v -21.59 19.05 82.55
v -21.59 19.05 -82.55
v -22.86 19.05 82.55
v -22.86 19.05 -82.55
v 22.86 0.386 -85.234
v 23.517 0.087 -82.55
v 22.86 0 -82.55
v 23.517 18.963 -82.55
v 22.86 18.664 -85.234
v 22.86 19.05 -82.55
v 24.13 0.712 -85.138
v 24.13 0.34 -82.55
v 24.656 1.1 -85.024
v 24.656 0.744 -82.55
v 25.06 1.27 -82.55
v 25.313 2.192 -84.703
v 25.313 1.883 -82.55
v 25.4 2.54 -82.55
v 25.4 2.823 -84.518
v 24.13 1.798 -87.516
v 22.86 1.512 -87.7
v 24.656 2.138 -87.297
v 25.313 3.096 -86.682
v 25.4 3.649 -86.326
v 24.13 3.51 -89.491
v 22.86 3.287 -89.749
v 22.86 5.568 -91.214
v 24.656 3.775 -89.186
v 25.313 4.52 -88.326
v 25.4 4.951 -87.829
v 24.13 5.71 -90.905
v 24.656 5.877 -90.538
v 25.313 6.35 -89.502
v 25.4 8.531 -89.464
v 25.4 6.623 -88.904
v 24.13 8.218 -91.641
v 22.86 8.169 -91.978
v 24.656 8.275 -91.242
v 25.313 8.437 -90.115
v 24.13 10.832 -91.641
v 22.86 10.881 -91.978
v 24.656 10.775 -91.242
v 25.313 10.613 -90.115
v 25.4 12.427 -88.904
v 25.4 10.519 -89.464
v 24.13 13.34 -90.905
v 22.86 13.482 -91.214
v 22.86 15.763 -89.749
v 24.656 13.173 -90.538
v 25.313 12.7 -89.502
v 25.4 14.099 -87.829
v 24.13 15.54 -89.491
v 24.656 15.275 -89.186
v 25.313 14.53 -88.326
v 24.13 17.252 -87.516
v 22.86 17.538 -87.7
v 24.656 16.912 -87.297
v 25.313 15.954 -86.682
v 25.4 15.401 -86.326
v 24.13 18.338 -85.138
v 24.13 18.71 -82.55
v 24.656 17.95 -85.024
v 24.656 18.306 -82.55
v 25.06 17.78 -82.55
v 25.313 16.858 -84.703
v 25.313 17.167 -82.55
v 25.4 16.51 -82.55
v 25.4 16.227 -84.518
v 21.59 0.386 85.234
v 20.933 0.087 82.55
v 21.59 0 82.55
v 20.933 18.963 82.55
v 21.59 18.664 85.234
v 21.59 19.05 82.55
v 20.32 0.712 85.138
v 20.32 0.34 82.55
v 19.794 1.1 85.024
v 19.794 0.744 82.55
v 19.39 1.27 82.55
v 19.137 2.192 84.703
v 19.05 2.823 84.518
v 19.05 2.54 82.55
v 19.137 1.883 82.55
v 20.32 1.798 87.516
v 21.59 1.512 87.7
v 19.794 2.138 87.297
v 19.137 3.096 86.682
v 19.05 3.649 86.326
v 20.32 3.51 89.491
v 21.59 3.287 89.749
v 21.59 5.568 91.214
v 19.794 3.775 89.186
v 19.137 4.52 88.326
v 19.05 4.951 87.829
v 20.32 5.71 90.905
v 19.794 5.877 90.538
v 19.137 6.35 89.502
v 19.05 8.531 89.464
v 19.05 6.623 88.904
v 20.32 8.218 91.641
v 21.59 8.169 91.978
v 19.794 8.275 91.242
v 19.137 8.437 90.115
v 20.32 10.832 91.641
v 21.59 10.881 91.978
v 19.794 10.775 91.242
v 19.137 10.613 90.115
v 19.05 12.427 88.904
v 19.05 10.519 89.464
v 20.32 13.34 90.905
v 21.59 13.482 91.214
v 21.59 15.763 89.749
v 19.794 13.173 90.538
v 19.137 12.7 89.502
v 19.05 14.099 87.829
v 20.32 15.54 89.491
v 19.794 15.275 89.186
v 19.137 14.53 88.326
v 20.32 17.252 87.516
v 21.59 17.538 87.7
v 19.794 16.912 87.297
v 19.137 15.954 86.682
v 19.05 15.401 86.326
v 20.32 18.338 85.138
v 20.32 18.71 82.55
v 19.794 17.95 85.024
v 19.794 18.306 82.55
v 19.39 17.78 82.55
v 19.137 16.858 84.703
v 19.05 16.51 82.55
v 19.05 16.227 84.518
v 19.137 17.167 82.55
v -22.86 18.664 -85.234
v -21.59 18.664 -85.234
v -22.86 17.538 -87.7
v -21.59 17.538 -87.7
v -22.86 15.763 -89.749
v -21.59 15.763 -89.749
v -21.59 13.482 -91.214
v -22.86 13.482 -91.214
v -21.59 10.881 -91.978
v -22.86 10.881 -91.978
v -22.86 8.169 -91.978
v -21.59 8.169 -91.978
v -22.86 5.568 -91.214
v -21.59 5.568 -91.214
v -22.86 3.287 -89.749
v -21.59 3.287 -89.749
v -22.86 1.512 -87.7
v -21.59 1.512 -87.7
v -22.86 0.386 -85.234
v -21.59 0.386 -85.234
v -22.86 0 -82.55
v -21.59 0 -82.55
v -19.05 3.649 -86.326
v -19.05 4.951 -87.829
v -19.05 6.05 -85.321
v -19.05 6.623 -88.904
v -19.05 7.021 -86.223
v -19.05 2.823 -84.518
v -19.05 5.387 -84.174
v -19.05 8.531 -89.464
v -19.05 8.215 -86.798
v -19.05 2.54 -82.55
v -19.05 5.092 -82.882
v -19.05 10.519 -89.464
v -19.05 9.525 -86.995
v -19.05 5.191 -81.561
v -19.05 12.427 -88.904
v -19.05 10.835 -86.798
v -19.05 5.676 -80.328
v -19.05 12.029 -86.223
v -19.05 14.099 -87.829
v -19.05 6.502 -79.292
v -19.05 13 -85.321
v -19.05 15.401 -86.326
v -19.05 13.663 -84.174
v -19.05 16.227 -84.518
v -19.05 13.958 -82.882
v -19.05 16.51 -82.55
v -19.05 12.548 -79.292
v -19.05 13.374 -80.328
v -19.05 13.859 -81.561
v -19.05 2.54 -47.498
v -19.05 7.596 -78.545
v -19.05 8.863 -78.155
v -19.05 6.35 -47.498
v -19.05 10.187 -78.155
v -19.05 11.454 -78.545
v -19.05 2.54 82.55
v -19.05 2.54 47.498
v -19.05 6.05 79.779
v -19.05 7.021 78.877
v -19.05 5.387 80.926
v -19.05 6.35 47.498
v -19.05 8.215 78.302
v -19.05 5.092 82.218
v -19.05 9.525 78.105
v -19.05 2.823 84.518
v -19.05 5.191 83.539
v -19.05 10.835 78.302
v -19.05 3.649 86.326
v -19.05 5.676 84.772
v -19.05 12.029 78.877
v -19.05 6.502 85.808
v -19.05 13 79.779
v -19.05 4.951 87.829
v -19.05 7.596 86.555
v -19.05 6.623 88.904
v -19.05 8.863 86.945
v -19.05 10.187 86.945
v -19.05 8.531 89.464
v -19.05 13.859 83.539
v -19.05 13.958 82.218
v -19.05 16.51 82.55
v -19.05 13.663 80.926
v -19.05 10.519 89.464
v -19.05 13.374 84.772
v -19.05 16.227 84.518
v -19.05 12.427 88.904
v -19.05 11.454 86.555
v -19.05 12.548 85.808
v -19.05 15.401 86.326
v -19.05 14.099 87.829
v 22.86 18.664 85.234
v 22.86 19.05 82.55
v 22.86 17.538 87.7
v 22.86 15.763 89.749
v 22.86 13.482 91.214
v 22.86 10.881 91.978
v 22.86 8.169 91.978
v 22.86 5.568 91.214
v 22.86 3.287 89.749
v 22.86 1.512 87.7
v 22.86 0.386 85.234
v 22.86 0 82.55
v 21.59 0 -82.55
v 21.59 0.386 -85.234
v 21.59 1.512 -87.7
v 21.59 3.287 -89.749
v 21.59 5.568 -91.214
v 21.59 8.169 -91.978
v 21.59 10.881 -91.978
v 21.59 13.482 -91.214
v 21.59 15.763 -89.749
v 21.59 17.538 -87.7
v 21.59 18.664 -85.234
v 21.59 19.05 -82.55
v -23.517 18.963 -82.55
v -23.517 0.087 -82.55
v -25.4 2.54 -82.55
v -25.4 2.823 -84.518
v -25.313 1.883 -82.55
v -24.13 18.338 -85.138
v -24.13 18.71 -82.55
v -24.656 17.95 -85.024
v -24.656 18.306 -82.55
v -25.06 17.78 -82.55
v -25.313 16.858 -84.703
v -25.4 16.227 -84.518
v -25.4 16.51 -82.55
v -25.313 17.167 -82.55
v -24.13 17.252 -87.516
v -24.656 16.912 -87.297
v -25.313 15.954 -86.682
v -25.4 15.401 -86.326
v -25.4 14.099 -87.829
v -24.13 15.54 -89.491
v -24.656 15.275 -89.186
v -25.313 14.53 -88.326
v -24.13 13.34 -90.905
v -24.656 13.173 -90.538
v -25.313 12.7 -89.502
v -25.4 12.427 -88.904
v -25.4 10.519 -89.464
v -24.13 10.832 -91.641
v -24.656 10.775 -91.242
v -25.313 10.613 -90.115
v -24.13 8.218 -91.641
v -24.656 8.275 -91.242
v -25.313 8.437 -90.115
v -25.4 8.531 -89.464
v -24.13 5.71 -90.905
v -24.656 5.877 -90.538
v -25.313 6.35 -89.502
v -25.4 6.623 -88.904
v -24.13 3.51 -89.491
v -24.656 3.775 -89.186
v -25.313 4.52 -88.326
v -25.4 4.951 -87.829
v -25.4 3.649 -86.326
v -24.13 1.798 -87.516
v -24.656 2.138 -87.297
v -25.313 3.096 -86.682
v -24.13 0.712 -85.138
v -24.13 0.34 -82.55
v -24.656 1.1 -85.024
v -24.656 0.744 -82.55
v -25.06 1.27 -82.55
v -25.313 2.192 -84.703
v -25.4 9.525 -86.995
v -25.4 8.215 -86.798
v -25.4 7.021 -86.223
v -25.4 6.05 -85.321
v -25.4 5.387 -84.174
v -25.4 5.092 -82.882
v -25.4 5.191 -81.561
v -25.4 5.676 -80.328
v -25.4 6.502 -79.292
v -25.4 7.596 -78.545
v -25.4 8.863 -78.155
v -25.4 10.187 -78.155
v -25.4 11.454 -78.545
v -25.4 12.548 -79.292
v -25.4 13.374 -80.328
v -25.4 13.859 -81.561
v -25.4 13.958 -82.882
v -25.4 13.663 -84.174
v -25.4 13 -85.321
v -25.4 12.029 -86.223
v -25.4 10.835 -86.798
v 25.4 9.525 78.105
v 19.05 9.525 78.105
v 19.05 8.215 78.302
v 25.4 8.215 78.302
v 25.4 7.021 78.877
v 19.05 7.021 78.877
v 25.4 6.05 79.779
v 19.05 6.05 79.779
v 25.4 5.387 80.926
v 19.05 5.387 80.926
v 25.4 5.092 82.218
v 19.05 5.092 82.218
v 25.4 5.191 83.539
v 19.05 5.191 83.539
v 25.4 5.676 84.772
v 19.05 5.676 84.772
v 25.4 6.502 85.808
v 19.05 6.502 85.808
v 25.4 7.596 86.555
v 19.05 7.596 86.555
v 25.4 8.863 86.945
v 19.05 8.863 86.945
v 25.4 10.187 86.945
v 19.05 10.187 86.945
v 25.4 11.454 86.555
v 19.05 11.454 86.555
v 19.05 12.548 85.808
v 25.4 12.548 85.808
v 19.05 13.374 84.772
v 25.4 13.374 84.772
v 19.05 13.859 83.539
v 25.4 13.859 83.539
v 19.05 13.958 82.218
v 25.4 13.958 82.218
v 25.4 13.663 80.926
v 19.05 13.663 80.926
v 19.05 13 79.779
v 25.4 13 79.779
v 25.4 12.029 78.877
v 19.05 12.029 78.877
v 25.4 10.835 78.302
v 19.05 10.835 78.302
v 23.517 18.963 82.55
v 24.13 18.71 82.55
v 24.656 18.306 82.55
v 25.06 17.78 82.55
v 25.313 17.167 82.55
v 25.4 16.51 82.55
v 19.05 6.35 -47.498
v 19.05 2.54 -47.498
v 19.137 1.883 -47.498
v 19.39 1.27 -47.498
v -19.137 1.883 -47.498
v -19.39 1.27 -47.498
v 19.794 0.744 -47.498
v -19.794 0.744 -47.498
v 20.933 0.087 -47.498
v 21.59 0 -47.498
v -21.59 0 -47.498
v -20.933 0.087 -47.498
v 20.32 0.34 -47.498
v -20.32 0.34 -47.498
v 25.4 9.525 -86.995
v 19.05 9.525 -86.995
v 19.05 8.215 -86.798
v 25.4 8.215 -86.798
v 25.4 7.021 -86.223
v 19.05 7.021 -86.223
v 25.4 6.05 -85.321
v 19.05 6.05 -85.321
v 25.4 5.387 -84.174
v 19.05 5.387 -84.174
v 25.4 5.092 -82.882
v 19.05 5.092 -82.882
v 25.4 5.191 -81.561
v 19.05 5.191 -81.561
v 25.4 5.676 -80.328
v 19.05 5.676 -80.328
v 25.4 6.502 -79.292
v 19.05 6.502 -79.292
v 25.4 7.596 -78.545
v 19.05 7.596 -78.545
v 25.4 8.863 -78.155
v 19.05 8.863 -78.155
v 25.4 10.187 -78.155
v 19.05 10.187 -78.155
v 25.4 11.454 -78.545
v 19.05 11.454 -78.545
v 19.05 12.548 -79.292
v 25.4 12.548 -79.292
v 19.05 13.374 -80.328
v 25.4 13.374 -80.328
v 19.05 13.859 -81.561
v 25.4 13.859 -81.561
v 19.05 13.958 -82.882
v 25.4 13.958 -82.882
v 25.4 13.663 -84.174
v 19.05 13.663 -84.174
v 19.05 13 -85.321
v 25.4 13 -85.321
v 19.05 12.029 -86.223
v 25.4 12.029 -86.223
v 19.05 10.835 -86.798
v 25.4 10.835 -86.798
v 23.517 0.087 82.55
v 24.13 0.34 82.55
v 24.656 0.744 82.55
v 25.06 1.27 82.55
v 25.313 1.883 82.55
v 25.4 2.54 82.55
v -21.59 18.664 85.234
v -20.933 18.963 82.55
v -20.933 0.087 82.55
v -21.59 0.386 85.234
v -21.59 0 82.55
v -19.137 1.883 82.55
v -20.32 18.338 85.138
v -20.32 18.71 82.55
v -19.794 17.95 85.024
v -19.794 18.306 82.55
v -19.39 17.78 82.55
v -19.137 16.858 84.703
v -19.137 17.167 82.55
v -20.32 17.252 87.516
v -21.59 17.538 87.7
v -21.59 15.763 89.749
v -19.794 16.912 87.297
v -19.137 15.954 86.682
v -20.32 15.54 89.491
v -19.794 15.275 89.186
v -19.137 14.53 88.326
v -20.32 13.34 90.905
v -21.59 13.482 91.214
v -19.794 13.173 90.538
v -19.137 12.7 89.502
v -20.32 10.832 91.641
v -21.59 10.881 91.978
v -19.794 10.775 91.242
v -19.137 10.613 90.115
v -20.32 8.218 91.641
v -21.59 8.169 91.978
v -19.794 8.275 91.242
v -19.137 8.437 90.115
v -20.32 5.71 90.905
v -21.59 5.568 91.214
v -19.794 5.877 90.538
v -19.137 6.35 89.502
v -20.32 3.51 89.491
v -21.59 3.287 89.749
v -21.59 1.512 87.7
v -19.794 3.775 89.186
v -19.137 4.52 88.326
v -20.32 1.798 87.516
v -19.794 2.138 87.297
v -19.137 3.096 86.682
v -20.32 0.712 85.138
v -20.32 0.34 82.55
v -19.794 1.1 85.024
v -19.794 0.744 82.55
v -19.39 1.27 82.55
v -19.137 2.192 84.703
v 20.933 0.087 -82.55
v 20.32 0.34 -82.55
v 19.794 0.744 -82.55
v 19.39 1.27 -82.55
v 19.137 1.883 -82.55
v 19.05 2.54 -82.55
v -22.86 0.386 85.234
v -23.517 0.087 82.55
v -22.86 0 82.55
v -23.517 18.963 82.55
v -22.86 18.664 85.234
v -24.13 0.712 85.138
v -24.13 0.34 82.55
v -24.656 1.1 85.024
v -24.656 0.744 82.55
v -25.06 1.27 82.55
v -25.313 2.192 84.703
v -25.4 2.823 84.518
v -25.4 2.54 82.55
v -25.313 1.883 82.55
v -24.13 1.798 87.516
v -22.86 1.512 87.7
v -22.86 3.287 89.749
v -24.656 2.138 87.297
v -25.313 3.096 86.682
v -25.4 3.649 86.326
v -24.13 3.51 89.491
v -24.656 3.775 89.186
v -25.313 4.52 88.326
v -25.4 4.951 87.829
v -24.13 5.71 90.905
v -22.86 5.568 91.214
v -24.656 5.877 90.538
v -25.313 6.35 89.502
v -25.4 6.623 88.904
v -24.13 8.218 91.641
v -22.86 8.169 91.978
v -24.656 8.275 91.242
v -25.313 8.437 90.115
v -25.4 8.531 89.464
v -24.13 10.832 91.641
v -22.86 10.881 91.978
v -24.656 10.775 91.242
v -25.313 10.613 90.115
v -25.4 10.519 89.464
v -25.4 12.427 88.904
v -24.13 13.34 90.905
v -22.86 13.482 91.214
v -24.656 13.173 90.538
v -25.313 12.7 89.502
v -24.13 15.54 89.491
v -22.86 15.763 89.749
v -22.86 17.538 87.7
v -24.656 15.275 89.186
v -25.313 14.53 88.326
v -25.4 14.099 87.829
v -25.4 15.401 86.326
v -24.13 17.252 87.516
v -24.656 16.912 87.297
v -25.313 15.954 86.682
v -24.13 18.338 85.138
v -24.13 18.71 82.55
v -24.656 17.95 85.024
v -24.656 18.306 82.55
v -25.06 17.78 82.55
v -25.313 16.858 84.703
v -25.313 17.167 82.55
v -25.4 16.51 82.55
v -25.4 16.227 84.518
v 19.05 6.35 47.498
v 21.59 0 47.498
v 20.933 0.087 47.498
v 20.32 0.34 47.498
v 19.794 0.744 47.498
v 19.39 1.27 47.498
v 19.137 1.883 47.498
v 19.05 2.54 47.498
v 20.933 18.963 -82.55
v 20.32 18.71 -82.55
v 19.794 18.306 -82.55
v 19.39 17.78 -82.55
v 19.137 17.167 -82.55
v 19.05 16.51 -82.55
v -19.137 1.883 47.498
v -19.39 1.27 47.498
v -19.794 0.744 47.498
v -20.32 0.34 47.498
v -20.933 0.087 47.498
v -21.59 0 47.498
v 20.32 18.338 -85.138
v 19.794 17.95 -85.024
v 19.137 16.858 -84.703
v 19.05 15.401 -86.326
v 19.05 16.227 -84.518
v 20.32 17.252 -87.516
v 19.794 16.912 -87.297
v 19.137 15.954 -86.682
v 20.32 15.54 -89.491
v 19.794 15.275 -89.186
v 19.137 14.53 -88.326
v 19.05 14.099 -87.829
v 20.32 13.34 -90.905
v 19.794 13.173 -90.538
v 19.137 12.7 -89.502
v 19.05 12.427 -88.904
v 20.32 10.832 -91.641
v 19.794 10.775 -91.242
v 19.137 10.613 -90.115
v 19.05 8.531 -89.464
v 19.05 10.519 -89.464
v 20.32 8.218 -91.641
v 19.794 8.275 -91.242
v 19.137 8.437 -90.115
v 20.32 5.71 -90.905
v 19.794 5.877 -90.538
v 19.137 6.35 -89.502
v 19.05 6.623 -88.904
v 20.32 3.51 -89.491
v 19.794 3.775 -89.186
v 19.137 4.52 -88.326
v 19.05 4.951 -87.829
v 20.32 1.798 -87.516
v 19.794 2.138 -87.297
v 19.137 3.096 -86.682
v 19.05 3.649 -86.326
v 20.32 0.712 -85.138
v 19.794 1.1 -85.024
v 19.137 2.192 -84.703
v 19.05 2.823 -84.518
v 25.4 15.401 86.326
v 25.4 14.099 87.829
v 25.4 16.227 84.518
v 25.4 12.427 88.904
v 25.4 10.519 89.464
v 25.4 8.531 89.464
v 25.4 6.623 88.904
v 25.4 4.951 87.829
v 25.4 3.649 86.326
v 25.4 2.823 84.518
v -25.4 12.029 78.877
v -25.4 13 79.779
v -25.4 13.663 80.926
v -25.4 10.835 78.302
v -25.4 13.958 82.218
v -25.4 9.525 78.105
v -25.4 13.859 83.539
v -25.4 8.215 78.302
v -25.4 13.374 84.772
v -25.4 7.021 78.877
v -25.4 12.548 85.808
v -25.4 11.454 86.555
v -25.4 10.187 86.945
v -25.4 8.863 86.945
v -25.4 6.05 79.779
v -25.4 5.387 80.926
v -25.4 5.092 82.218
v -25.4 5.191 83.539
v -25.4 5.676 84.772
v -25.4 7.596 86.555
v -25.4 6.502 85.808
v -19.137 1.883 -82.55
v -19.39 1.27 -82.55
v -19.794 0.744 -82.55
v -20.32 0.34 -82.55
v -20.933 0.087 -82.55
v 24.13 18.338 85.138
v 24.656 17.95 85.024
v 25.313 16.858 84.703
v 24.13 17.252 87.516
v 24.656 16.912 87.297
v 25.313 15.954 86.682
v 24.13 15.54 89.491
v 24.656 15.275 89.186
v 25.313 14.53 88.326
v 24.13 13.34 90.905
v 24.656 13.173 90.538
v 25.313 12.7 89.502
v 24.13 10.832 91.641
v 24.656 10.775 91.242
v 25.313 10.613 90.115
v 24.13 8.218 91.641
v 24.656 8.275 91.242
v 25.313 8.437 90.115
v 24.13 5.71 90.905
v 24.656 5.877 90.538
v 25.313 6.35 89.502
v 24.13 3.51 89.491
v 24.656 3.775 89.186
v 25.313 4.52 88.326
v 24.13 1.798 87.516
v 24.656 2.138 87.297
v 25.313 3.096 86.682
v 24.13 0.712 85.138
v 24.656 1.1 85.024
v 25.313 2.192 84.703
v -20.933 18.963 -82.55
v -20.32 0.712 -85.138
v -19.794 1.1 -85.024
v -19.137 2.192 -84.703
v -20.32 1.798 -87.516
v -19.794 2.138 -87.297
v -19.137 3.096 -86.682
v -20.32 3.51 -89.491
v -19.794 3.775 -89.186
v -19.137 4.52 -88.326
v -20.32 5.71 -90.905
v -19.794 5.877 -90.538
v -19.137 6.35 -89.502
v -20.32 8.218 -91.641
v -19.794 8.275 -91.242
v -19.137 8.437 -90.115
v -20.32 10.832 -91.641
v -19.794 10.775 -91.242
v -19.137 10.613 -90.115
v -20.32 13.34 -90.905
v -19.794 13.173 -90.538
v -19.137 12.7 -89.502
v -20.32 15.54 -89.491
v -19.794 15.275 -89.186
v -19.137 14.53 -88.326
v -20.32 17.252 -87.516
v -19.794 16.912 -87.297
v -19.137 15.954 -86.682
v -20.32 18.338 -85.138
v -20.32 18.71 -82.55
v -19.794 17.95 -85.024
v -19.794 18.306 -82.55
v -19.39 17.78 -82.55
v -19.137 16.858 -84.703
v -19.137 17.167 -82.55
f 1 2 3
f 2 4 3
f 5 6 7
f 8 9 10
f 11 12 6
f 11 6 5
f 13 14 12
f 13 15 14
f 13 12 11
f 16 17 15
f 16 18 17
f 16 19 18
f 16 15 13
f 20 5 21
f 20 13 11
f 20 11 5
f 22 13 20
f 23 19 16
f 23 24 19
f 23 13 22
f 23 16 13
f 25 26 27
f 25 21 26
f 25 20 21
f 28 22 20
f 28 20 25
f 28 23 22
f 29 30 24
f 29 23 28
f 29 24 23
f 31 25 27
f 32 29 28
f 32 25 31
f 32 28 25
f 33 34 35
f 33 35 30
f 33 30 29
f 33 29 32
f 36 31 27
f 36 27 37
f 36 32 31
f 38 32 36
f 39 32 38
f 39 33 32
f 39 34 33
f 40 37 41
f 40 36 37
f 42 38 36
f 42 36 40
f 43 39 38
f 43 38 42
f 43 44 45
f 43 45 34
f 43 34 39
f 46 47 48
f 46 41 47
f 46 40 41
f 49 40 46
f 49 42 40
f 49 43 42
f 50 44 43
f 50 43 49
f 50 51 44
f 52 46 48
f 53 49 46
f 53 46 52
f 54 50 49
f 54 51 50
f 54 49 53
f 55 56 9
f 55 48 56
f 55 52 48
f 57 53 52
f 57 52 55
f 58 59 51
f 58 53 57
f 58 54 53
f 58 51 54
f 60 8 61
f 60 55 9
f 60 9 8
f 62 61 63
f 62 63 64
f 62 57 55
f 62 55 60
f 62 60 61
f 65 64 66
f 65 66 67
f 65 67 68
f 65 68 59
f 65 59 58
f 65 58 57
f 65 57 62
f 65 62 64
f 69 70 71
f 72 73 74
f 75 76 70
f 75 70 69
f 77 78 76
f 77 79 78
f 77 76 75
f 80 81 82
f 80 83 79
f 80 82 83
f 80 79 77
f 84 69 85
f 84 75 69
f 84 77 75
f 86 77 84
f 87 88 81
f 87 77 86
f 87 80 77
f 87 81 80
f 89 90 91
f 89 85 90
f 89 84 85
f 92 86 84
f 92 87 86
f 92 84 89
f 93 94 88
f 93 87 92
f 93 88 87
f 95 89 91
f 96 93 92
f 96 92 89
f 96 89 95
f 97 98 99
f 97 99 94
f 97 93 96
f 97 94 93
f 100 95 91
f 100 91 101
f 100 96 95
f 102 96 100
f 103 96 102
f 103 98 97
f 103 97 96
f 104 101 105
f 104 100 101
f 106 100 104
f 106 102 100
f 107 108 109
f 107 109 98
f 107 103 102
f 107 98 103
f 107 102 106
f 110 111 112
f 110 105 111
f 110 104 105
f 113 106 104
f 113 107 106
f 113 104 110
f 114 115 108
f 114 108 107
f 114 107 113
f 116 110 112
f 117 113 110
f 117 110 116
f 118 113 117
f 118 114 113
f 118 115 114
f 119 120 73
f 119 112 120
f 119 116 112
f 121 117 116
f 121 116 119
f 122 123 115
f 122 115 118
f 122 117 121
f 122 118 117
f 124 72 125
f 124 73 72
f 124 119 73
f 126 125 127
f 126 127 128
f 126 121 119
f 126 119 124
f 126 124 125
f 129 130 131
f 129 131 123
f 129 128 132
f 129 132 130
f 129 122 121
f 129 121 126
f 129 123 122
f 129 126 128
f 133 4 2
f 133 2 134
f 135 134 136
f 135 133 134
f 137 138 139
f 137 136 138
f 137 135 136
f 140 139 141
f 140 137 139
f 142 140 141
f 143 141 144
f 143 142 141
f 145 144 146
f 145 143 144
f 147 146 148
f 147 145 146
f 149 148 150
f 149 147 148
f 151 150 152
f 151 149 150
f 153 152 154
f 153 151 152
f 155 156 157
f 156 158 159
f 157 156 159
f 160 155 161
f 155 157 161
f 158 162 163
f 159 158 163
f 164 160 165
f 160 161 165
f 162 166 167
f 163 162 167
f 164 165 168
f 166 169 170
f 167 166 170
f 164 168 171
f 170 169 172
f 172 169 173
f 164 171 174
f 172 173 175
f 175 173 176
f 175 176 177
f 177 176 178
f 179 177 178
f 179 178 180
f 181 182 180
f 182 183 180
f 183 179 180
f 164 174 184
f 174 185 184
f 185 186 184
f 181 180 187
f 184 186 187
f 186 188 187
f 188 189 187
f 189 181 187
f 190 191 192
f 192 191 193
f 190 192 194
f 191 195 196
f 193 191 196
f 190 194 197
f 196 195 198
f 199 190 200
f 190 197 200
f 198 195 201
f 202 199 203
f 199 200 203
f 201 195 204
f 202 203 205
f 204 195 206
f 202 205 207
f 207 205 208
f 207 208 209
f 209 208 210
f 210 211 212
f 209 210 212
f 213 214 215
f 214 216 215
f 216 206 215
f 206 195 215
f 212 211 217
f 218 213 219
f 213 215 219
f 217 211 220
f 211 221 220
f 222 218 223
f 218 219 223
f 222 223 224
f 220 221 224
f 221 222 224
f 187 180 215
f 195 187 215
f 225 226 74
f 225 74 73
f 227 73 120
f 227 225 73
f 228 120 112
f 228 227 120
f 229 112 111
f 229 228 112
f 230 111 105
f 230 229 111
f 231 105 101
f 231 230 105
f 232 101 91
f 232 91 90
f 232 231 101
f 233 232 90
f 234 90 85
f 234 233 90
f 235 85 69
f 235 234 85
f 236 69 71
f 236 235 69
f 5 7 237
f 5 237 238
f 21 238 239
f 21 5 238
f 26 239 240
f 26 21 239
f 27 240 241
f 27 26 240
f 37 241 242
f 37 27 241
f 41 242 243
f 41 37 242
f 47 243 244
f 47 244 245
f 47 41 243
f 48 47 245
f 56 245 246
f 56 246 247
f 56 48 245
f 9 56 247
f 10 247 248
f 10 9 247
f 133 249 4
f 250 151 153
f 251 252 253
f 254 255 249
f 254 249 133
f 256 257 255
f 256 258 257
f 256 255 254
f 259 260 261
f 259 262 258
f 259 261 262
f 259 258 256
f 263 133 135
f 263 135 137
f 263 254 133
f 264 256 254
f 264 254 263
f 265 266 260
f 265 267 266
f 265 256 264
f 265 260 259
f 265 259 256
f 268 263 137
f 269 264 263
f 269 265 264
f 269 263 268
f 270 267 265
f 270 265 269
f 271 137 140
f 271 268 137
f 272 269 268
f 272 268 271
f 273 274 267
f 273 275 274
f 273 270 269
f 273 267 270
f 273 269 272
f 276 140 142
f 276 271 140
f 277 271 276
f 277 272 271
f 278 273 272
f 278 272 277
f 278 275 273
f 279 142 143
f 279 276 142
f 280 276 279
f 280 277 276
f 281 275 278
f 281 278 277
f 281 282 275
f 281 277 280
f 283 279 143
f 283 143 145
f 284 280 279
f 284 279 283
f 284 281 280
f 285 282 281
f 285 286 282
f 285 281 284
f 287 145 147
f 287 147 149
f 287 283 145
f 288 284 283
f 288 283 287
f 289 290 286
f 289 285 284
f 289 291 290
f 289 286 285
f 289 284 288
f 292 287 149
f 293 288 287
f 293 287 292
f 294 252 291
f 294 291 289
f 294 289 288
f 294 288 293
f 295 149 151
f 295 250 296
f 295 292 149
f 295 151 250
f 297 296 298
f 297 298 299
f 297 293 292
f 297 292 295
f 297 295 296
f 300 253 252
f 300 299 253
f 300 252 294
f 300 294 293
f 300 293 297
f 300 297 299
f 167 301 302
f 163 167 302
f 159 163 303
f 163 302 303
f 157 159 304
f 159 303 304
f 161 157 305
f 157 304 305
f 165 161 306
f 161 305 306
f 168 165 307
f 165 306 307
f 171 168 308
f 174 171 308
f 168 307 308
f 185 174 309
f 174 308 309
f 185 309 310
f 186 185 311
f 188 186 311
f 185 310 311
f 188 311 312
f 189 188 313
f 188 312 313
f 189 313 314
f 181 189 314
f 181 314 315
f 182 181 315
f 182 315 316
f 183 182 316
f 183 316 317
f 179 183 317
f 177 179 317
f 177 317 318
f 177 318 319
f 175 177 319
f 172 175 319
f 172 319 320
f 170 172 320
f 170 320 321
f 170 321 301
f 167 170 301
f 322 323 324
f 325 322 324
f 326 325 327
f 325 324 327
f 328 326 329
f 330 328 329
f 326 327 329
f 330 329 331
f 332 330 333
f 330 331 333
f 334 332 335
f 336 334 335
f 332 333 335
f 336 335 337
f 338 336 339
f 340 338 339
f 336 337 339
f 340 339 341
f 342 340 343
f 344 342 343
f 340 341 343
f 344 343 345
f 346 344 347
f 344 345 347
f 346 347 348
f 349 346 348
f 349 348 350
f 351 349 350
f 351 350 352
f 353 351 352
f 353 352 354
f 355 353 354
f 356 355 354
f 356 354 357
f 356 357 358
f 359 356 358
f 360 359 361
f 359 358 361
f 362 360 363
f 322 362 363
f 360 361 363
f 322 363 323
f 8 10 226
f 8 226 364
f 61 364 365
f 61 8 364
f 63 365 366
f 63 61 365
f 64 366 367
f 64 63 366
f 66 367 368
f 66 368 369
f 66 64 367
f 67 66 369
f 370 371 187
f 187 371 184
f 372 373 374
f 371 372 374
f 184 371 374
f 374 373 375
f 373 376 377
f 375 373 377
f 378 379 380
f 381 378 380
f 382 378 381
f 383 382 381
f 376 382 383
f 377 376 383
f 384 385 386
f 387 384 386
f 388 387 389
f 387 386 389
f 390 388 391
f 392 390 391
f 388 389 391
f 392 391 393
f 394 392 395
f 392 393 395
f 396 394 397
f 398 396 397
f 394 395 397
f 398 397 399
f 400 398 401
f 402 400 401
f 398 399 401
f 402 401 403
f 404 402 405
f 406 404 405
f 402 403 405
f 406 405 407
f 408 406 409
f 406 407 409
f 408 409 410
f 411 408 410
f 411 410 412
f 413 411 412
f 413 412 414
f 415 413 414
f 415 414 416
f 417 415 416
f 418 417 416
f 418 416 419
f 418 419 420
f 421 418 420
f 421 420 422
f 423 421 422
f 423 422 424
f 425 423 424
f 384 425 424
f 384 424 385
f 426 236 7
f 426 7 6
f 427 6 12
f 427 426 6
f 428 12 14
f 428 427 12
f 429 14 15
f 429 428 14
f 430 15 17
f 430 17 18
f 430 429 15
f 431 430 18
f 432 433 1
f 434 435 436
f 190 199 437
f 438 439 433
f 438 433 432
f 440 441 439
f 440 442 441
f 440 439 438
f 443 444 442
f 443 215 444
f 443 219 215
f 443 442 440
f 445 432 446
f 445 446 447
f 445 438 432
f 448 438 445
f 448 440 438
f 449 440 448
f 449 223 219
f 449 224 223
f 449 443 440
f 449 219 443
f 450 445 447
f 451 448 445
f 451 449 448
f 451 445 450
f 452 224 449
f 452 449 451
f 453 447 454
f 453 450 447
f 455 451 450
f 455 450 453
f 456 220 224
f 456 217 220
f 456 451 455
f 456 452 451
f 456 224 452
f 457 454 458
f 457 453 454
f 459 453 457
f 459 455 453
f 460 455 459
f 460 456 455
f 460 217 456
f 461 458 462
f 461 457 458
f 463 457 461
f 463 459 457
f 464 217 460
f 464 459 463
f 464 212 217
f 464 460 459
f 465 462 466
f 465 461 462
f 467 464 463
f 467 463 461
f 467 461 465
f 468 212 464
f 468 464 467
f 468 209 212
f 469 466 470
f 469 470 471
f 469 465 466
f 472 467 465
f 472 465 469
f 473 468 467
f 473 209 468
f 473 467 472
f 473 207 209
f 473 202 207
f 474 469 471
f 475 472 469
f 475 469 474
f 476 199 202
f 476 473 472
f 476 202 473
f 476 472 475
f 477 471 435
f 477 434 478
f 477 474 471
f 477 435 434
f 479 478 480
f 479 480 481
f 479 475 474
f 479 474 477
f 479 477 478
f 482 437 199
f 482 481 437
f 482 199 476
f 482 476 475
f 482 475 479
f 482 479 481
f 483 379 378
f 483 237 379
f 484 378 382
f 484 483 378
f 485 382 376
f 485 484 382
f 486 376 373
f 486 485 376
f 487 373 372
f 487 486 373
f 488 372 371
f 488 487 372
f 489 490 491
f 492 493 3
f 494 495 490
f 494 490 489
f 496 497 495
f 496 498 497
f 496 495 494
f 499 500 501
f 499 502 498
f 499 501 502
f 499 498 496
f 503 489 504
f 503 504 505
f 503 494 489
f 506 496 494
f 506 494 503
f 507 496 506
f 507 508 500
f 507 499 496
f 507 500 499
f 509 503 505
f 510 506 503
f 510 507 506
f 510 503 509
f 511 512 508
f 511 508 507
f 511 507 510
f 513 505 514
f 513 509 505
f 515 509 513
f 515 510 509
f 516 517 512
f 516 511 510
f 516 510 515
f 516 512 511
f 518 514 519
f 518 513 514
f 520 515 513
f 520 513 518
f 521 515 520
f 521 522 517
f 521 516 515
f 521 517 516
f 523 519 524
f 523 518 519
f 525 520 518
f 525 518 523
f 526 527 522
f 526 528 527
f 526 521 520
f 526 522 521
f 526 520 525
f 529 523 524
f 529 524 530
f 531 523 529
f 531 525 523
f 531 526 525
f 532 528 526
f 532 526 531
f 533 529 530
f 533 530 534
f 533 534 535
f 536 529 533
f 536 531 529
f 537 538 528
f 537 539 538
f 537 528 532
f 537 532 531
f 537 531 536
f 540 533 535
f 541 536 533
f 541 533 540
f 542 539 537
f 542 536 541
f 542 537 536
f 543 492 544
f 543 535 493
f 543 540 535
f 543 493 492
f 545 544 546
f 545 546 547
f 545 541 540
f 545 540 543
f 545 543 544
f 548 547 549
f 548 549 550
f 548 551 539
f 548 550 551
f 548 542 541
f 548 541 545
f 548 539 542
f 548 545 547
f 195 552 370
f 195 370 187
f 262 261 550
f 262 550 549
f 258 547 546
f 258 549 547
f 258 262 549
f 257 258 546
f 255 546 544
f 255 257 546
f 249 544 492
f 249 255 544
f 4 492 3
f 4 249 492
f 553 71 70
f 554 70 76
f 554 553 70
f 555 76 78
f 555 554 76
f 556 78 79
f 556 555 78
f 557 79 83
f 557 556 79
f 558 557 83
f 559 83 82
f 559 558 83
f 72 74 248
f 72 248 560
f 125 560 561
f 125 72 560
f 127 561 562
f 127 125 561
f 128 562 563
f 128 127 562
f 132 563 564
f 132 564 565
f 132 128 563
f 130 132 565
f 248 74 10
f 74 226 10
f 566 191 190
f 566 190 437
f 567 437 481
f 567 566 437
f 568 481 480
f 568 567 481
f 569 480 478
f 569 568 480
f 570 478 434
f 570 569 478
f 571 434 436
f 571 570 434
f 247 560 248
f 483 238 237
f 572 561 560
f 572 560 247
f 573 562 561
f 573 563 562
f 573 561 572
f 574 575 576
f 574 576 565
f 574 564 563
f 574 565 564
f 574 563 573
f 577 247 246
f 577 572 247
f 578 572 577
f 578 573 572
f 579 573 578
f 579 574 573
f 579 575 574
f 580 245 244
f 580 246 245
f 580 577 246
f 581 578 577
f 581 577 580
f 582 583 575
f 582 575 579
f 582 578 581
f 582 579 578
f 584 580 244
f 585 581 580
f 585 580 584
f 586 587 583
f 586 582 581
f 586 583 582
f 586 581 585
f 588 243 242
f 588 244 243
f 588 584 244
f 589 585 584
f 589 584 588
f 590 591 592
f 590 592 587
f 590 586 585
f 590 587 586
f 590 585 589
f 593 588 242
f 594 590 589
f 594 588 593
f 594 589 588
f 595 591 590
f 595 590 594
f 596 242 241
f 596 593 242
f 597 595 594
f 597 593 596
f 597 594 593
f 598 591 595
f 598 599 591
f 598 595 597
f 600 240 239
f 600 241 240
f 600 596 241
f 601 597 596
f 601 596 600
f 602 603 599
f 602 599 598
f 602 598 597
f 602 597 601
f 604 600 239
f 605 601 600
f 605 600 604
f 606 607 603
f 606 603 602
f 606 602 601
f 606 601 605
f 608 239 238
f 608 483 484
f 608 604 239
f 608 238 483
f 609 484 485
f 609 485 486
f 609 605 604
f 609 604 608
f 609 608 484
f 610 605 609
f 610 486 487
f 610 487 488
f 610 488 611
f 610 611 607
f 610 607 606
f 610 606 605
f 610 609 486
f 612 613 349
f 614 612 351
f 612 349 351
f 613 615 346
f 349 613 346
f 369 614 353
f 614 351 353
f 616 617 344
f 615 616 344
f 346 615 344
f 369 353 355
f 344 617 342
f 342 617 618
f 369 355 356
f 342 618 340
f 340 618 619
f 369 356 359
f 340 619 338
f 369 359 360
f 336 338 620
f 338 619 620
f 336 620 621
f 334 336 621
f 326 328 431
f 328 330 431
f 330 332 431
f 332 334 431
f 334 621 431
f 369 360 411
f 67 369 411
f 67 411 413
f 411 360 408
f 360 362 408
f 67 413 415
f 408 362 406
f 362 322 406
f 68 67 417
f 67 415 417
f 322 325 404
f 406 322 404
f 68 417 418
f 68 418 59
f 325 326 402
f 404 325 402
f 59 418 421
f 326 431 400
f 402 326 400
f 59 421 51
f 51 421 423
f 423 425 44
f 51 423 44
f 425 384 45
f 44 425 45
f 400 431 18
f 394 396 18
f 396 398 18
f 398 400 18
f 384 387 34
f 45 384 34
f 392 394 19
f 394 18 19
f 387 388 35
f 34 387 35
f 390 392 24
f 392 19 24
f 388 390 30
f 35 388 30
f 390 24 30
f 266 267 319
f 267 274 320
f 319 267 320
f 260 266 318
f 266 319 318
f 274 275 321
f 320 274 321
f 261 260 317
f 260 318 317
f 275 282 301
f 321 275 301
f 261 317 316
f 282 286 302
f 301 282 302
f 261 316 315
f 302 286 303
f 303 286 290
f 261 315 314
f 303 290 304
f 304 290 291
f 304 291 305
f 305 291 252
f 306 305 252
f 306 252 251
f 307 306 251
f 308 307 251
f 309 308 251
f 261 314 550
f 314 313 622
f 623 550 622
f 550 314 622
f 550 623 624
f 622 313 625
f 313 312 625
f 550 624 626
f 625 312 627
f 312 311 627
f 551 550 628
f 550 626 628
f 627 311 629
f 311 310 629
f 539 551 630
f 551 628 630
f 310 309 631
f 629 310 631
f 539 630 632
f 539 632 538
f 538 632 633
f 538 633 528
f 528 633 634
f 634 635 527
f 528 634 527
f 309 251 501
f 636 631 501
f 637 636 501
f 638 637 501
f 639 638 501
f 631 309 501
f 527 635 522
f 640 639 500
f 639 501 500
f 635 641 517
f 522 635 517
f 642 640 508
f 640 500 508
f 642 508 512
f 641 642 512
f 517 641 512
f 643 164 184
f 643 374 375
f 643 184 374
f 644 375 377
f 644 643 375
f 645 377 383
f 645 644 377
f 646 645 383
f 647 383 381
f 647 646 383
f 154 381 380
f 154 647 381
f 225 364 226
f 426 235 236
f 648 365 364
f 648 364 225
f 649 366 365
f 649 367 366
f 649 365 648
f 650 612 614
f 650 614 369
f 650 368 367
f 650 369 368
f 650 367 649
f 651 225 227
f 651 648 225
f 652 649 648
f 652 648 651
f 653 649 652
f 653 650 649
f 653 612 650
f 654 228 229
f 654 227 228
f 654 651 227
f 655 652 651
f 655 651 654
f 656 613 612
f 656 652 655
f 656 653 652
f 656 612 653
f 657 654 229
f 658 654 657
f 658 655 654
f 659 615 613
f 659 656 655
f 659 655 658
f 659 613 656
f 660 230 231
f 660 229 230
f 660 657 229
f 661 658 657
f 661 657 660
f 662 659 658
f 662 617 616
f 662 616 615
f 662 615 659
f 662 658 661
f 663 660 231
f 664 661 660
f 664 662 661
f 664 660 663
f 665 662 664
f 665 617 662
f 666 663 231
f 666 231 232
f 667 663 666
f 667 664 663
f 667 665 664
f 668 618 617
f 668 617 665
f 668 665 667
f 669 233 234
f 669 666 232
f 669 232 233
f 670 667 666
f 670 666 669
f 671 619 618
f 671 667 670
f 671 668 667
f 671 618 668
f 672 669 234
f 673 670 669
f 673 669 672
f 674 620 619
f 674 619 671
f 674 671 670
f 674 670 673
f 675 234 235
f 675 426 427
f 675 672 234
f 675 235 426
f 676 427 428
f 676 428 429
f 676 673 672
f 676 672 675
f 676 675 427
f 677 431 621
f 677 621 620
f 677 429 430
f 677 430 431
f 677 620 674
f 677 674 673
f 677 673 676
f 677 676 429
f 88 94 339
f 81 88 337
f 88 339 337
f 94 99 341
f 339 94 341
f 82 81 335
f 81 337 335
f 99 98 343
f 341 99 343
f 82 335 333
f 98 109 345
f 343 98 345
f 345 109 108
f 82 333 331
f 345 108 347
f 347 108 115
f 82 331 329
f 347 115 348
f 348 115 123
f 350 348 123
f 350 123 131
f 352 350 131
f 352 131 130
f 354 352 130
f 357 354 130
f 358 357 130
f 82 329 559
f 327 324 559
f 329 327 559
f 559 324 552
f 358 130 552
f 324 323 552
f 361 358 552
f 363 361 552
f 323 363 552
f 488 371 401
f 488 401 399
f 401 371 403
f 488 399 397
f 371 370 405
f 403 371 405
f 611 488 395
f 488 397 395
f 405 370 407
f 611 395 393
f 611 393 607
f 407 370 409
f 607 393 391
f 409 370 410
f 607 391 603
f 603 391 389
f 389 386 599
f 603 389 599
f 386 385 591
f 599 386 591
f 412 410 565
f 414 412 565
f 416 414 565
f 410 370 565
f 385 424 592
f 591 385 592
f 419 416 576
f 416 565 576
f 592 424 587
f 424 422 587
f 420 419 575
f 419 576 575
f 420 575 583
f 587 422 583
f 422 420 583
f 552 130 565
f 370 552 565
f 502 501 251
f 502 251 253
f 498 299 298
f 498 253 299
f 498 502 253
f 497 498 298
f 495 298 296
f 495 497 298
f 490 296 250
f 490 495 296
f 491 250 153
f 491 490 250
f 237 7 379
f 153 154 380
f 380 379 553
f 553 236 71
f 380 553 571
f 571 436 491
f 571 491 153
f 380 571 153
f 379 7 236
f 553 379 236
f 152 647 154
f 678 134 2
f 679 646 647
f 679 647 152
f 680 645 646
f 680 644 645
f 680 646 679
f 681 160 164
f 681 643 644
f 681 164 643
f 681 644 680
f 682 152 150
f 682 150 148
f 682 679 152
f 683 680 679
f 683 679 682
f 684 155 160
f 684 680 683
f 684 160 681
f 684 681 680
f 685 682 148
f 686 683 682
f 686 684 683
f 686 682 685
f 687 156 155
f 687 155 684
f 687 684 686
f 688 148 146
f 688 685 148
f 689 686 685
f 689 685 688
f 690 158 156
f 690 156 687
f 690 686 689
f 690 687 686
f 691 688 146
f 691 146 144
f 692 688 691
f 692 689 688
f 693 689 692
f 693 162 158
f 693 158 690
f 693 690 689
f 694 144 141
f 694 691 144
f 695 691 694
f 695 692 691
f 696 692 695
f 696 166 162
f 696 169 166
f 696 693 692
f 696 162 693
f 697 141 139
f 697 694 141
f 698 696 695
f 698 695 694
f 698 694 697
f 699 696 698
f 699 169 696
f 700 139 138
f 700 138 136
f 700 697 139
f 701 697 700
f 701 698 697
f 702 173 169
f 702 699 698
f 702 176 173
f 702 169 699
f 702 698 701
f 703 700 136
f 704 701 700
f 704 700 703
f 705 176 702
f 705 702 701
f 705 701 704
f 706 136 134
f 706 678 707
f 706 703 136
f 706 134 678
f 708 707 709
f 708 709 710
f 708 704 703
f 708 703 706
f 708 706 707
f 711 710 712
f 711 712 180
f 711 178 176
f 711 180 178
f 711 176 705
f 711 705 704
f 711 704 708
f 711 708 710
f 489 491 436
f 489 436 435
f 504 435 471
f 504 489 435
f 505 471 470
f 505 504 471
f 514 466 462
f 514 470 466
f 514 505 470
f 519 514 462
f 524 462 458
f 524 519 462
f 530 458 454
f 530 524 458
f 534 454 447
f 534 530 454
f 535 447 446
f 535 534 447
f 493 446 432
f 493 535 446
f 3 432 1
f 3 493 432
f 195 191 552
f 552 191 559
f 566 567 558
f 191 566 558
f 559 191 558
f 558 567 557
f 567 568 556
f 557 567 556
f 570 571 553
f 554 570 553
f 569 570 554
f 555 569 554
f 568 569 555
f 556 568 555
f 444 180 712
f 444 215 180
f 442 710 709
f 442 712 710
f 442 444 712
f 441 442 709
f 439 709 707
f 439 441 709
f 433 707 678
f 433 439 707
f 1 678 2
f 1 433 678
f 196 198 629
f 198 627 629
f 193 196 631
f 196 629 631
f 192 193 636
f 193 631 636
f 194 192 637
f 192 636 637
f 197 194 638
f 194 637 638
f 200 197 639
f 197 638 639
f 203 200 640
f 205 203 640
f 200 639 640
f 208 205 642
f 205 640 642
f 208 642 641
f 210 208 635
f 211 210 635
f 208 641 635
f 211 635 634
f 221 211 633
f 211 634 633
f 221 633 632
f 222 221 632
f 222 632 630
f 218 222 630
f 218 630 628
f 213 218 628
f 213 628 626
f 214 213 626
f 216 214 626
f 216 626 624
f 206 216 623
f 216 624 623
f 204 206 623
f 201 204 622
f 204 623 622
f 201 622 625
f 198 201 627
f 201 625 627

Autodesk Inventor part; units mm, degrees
ref_plane "YZ Plane" through (0, 0, 0) normal (1, 0, 0) x (0, 1, 0)
ref_plane "XZ Plane" through (0, 0, 0) normal (0, 1, 0) x (-1, 0, 0)
ref_plane "XY Plane" through (0, 0, 0) normal (0, 0, 1) x (1, 0, 0)
sketch "Sketch1" plane through (0, 0, 0) normal (0, 1, 0) x (-1, 0, 0)
  line L0 (25.4, 47.498) -> (-25.4, 47.498)
  line L1 (-25.4, 47.498) -> (-25.4, -47.498)
  line L2 (-25.4, -47.498) -> (25.4, -47.498)
  line L3 (25.4, -47.498) -> (25.4, 47.498)
  line L4 (25.4, 47.498) -> (-25.4, -47.498) construction
  line L5 (-25.4, 47.498) -> (25.4, -47.498) construction
  point P0 (0, 0)
  dimension "d0" = 50.8
  dimension "d1" = 94.996
extrude "Extrusion1" add sketch "Sketch1" along normal blind 6.35
sketch "Sketch2" plane through (25.4, 0, 47.498) normal (1, 0, 0) x (0, 0, -1)
  line L0 (-35.052, 19.05) -> (130.048, 19.05)
  line L1 (130.048, 19.05) -> (130.048, 0)
  line L2 (130.048, 0) -> (-35.052, 0)
  line L3 (-35.052, 0) -> (-35.052, 19.05)
  line L4 (-35.052, 19.05) -> (130.048, 0) construction
  line L5 (130.048, 19.05) -> (-35.052, 0) construction
  line L6 (0, 0) -> (94.996, 0) projected
  circle A0 centre (-35.052, 9.525) radius 9.525
  circle A1 centre (130.048, 9.525) radius 9.525
  point P0 (47.498, 0)
  point P1 (47.498, 9.525)
  point P2 (47.498, 0)
  dimension "d4" = 165.1
  dimension "d5" = 19.05
extrude "Extrusion2" add sketch "Sketch2" against normal blind 6.35
fillet "Fillet1" radius 2.54 9 edges at (19.05, 0, -65.024) (19.05, 19.05, 0) (19.05, 9.525, 92.075) (19.05, 0, 65.024) (19.05, 9.525, -92.075) (25.4, 19.05, 0) (25.4, 9.525, 92.075) (25.4, 0, 0) (25.4, 9.525, -92.075)
mirror "Mirror1" about plane through (0, 0, 0) normal (1, 0, 0) of "Extrusion2", "Fillet1"
sketch "Sketch3" plane through (25.4, 9.525, 82.55) normal (1, 0, 0) x (0, 0, -1)
  arc A0 (165.1, -6.985) -> (165.1, 6.985) centre (165.1, 0) ccw projected
  point P0 (82.55, -9.525)
  point P1 (0, 0)
hole "Hole1" at (25.4, 9.525, 82.55) at (25.4, 9.525, -82.55) direction (-1, 0, 0) diameter 8.89 end through all
properties part number "Thick Leg"
